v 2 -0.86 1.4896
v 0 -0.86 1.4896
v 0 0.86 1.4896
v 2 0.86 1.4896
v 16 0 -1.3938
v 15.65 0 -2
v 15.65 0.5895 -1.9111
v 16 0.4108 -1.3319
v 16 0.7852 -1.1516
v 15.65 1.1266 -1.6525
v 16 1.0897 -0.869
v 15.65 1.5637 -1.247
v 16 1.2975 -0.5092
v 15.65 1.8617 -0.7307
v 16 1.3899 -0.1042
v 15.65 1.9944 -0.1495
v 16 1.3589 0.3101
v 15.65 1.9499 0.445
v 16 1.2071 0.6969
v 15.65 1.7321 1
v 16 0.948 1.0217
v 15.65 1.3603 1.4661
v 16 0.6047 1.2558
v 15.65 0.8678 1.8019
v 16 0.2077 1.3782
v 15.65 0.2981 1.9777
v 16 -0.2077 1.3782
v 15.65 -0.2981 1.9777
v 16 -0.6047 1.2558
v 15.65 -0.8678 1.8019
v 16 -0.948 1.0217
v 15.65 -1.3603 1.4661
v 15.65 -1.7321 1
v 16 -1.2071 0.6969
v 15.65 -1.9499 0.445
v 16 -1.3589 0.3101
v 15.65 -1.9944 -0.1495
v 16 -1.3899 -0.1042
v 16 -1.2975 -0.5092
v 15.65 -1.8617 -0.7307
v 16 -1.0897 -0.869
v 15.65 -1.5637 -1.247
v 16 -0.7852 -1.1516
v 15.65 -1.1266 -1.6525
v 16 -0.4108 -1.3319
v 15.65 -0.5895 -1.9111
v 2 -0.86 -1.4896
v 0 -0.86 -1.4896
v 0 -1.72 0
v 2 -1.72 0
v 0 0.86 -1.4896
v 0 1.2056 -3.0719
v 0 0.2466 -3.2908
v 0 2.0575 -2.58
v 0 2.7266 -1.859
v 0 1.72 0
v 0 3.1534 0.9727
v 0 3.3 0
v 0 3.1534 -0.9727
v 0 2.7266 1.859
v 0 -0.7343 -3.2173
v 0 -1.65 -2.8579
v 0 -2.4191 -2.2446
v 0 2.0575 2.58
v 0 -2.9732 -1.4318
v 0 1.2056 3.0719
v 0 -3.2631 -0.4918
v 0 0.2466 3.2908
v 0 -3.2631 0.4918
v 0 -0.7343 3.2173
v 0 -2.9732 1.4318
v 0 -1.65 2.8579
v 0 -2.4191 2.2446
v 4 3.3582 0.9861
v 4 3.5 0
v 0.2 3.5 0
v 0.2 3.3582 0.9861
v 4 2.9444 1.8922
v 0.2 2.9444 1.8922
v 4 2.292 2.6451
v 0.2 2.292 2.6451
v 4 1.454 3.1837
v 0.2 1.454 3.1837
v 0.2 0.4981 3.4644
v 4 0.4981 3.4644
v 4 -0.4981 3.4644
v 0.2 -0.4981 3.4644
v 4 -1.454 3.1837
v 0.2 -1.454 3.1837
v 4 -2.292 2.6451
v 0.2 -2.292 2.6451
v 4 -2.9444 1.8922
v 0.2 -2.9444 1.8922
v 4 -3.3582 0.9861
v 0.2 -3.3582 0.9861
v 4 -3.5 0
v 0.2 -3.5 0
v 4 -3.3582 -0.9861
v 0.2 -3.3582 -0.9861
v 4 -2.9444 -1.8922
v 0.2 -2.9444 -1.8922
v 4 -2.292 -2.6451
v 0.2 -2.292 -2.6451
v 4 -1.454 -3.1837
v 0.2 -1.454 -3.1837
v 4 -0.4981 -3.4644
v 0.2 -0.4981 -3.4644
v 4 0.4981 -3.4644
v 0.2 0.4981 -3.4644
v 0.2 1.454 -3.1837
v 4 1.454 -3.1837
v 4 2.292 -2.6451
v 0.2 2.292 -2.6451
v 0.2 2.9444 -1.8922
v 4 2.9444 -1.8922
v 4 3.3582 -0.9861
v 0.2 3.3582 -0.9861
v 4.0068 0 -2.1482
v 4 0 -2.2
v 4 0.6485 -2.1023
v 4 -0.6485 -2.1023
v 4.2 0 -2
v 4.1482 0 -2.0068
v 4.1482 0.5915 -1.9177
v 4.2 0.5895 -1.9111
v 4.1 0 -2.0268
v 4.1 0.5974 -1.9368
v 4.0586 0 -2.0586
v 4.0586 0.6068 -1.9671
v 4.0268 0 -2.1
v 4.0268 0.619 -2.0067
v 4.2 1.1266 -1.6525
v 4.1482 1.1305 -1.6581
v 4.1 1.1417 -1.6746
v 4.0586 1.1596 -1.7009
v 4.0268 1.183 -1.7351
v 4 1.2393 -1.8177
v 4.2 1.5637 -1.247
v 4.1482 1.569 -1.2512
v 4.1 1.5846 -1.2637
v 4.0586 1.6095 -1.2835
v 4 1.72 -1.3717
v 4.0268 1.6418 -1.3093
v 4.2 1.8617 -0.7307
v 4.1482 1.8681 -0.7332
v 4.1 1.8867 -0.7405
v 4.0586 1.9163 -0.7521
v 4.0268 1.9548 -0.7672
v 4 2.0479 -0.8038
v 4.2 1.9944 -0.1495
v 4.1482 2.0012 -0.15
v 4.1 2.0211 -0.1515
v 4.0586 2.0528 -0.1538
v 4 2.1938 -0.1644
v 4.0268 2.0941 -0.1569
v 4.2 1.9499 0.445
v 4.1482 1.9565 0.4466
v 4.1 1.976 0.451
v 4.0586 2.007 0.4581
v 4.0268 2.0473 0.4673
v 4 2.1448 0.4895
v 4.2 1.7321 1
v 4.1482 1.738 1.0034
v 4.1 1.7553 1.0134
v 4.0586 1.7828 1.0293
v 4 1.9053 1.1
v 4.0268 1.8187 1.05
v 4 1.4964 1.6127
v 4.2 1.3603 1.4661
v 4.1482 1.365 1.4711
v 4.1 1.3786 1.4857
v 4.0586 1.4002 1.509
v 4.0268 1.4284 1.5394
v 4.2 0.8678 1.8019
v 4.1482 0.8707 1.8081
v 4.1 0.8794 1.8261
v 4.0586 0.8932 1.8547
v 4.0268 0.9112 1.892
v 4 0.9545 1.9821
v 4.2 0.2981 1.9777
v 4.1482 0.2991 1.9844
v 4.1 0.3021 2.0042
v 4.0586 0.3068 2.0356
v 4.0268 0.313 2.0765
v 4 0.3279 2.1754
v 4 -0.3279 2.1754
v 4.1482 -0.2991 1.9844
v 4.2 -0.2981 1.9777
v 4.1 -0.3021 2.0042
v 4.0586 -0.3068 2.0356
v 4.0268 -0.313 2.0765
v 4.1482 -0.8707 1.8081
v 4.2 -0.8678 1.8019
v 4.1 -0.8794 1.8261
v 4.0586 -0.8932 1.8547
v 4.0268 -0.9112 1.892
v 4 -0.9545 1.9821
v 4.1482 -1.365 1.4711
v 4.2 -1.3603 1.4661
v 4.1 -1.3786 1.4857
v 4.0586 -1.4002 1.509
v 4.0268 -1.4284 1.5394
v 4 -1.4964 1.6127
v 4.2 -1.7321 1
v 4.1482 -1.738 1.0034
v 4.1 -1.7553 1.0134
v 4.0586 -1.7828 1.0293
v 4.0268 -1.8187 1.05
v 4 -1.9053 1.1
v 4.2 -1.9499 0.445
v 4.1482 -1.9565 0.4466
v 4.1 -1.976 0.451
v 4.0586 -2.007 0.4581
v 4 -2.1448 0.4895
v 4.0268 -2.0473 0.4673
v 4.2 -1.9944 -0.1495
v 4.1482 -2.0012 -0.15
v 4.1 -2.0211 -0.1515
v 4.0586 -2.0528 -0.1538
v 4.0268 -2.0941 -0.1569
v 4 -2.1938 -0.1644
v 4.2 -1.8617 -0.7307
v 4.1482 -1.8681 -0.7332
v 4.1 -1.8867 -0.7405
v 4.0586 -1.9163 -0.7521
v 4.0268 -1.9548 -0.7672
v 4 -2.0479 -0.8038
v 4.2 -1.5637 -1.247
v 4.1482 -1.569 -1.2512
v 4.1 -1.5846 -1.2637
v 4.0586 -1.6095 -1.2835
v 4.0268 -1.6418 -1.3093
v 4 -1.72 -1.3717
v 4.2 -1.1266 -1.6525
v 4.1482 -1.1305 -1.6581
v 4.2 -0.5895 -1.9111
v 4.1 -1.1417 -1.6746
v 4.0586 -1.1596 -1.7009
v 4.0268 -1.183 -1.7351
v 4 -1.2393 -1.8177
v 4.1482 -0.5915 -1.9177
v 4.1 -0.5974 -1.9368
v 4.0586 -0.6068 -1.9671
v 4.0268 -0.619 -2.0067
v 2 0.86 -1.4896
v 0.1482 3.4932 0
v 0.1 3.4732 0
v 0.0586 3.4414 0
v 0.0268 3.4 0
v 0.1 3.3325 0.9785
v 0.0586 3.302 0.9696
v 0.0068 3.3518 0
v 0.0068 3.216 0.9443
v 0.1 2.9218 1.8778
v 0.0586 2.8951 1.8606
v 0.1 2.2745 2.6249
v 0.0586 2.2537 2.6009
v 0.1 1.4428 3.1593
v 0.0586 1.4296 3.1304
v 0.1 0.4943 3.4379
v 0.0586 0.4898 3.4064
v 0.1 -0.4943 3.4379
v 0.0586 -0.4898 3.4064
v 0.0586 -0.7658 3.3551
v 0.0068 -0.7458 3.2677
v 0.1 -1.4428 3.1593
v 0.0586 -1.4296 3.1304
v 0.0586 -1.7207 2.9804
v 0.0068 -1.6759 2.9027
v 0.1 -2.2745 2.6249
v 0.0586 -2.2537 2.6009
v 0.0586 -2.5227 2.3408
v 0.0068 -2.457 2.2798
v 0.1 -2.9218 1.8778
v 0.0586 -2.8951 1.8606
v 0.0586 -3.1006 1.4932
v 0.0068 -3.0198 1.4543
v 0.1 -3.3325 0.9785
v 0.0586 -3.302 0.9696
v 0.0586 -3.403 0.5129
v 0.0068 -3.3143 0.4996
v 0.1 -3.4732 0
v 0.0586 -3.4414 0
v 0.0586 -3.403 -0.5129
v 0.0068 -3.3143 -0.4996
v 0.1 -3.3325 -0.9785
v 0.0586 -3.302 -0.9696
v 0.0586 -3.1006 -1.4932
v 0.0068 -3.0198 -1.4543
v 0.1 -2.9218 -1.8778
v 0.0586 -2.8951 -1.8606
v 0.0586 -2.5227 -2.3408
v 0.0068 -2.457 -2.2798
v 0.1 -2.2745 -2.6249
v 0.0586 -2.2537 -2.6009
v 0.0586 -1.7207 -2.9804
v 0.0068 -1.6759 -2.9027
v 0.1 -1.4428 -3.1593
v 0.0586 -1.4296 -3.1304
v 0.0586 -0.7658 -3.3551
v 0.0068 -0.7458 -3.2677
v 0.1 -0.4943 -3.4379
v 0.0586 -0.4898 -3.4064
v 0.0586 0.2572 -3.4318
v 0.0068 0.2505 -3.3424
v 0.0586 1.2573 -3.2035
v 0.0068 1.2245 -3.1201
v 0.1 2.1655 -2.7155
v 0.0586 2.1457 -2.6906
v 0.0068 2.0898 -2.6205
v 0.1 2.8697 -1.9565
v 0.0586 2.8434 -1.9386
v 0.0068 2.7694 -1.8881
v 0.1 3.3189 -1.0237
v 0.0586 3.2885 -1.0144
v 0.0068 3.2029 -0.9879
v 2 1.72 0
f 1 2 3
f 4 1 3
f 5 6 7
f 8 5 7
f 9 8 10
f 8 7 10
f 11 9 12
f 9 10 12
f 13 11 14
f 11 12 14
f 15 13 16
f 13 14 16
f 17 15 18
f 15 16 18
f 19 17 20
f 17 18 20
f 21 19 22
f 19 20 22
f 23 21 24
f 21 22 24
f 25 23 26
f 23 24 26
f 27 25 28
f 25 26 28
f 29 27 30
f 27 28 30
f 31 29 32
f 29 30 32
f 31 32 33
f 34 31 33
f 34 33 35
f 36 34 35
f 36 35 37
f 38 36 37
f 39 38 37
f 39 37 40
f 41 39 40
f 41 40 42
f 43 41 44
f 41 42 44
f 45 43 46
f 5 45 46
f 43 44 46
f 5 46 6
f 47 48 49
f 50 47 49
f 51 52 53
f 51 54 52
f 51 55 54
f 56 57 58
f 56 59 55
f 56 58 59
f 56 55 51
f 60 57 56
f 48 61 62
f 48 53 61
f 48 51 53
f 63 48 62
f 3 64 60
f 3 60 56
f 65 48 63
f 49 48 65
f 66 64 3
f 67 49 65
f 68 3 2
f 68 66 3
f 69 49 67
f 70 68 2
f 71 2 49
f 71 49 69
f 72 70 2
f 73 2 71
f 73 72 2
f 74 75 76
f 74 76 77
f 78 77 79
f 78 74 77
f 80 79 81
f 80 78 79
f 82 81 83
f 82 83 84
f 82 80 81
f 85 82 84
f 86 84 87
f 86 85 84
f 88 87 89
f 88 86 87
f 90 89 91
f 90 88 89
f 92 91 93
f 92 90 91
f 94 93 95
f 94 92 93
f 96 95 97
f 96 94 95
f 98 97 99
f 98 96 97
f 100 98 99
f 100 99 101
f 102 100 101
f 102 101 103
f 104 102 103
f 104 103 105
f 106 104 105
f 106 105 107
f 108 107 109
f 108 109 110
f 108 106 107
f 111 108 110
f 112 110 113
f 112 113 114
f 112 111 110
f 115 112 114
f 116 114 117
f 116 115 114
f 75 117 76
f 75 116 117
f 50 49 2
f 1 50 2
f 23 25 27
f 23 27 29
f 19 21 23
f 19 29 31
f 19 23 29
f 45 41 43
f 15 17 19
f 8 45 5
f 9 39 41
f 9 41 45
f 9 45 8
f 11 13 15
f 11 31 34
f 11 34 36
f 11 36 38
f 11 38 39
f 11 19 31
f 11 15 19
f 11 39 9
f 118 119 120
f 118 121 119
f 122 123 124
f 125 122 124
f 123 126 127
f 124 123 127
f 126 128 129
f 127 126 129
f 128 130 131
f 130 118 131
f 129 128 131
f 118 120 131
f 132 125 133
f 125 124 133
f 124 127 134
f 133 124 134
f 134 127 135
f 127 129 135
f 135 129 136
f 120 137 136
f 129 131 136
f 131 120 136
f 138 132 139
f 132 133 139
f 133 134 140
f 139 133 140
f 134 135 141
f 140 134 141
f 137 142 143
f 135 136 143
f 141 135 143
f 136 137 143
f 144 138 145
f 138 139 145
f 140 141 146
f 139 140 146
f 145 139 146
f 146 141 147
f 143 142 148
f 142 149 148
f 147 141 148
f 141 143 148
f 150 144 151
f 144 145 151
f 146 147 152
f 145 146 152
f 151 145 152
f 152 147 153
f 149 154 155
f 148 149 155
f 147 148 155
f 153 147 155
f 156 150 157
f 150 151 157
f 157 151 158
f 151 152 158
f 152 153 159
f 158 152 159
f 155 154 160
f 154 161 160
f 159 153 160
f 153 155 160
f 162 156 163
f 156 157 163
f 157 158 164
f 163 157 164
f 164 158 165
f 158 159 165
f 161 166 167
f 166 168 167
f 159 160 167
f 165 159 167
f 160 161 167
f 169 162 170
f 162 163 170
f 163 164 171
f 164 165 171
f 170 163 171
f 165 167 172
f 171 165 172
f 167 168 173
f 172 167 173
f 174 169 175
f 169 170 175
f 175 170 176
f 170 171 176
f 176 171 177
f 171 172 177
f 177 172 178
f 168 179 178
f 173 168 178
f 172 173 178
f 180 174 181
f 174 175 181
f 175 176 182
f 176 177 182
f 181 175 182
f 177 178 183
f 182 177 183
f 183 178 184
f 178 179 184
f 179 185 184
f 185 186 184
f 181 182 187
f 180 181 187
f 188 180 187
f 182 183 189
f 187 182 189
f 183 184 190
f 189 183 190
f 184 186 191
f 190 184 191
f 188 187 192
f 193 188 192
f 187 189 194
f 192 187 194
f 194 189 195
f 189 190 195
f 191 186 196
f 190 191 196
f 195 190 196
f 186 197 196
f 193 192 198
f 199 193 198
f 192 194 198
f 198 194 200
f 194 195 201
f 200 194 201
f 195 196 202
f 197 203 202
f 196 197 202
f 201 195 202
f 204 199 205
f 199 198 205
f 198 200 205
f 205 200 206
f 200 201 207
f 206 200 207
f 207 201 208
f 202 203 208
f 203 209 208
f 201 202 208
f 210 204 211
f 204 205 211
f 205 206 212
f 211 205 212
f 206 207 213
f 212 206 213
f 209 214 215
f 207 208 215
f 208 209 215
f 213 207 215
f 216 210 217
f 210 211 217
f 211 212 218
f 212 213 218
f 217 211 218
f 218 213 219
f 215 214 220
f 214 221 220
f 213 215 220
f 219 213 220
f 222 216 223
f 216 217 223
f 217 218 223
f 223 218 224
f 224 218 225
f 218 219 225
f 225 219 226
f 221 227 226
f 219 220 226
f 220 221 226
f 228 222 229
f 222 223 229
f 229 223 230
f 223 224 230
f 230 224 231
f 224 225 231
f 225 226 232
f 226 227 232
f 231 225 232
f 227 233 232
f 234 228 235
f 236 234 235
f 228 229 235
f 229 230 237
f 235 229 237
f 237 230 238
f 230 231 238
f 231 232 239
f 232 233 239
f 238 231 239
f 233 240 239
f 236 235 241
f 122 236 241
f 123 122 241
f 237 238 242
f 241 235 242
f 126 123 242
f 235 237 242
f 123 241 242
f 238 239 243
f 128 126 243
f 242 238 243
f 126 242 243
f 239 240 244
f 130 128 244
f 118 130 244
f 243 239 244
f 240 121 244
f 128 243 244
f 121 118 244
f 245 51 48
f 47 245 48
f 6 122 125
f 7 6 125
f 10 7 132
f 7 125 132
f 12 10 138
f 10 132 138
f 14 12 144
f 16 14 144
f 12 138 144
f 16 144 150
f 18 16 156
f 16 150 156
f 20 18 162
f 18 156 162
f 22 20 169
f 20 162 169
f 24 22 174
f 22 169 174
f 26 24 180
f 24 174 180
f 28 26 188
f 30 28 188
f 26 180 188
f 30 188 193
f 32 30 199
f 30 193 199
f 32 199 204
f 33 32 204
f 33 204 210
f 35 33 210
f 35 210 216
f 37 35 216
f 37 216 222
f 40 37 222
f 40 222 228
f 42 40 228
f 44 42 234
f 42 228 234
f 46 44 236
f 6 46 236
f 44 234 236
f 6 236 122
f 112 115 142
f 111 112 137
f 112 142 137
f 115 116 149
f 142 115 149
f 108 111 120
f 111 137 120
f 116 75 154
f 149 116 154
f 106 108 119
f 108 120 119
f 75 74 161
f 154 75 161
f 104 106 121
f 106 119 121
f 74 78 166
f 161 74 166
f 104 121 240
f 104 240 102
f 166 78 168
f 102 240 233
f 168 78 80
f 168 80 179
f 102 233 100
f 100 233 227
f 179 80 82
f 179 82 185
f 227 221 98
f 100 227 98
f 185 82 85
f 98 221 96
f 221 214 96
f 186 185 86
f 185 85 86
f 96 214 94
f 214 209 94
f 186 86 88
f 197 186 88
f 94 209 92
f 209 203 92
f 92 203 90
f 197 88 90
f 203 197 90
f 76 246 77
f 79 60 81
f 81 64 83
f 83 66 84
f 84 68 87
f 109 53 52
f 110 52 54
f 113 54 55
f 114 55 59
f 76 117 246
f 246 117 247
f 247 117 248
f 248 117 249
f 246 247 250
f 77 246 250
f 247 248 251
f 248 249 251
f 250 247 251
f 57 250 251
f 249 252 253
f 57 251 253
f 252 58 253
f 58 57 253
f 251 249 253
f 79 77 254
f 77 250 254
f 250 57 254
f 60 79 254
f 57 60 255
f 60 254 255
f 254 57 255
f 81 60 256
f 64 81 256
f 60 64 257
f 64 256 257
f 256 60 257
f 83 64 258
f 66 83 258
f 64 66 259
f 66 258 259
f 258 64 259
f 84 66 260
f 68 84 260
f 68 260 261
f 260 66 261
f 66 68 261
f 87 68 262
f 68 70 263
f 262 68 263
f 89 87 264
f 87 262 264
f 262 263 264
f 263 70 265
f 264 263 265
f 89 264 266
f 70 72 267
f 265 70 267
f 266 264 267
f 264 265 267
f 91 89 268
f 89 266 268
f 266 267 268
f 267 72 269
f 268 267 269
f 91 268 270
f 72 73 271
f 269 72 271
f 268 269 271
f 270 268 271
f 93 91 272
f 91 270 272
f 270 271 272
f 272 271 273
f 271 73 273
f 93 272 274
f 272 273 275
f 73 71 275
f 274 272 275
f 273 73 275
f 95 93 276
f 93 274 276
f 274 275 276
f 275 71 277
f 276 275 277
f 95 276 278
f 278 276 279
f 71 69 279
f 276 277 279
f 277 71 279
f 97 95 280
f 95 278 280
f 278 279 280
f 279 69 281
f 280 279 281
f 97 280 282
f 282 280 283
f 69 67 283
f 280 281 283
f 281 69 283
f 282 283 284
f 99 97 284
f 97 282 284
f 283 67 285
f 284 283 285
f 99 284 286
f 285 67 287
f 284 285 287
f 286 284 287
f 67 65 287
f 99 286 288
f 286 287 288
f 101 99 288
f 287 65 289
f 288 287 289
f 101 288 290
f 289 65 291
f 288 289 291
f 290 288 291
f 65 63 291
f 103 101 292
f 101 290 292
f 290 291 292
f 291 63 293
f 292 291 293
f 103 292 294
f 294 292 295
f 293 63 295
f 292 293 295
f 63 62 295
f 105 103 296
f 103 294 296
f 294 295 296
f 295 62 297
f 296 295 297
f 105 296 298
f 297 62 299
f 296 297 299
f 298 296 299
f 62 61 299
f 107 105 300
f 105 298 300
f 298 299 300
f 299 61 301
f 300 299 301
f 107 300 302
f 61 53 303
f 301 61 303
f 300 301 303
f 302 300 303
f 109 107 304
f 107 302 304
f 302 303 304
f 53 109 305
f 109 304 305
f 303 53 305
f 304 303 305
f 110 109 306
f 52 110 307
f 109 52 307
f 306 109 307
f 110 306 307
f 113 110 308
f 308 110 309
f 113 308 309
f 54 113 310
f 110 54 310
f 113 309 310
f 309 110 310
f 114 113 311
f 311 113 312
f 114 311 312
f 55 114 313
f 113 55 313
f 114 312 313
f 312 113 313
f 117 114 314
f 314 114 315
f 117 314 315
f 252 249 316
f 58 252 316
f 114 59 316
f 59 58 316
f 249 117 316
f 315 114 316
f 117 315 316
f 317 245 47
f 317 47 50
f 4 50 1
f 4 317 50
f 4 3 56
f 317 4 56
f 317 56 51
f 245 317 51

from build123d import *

# Parameters (mm, degrees)
SKETCH_1_W          = 4
SKETCH_1_H          = 3.5
SKETCH_2_R          = 2
EXTRUDE_1_DEPTH     = 12
CUT_EXTRUDE_1_DEPTH = 2
CHAMFER_1_SIZE      = 0.6062
CHAMFER_1_SIZE2     = 0.35
FILLET_1_R          = 0.2


with BuildPart() as part:
    # 草图1 → 旋转1 (revolve)
    with BuildSketch(Plane.XY):
        with Locations((2, 1.75)):
            Rectangle(SKETCH_1_W, SKETCH_1_H)
    revolve(axis=Axis((0, 0, 0), (1, 0, 0)))

    # 草图2 → 凸台-拉伸1 (add)
    with BuildSketch(Plane(origin=(4, 0, 0), x_dir=(0, 0, -1), z_dir=(1, 0, 0))):
        Circle(SKETCH_2_R)
    extrude(amount=EXTRUDE_1_DEPTH)

    # 草图3 → 切除-拉伸1 (cut)
    with BuildSketch(Plane.ZY):
        Polygon((0, 1.72), (-1.489563695, 0.86), (-1.489563695, -0.86), (0, -1.72), (1.489563695, -0.86), (1.489563695, 0.86), align=None)
    extrude(amount=-CUT_EXTRUDE_1_DEPTH, mode=Mode.SUBTRACT)

    # 倒角1
    chamfer_1_edges = [part.edges().sort_by_distance(p)[0] for p in [
        (16, 0, 2),
    ]]
    chamfer_1_side = [part.faces().sort_by_distance(p)[0] for p in [
        (16, 0, 0),
    ]]
    chamfer(chamfer_1_edges, length=CHAMFER_1_SIZE, length2=CHAMFER_1_SIZE2, reference=chamfer_1_side[0])

    # 圆角1
    fillet_1_edges = [part.edges().sort_by_distance(p)[0] for p in [
        (0, -3.5, 0),
        (4, 0, 2),
    ]]
    fillet(fillet_1_edges, radius=FILLET_1_R)


solid = part.part
